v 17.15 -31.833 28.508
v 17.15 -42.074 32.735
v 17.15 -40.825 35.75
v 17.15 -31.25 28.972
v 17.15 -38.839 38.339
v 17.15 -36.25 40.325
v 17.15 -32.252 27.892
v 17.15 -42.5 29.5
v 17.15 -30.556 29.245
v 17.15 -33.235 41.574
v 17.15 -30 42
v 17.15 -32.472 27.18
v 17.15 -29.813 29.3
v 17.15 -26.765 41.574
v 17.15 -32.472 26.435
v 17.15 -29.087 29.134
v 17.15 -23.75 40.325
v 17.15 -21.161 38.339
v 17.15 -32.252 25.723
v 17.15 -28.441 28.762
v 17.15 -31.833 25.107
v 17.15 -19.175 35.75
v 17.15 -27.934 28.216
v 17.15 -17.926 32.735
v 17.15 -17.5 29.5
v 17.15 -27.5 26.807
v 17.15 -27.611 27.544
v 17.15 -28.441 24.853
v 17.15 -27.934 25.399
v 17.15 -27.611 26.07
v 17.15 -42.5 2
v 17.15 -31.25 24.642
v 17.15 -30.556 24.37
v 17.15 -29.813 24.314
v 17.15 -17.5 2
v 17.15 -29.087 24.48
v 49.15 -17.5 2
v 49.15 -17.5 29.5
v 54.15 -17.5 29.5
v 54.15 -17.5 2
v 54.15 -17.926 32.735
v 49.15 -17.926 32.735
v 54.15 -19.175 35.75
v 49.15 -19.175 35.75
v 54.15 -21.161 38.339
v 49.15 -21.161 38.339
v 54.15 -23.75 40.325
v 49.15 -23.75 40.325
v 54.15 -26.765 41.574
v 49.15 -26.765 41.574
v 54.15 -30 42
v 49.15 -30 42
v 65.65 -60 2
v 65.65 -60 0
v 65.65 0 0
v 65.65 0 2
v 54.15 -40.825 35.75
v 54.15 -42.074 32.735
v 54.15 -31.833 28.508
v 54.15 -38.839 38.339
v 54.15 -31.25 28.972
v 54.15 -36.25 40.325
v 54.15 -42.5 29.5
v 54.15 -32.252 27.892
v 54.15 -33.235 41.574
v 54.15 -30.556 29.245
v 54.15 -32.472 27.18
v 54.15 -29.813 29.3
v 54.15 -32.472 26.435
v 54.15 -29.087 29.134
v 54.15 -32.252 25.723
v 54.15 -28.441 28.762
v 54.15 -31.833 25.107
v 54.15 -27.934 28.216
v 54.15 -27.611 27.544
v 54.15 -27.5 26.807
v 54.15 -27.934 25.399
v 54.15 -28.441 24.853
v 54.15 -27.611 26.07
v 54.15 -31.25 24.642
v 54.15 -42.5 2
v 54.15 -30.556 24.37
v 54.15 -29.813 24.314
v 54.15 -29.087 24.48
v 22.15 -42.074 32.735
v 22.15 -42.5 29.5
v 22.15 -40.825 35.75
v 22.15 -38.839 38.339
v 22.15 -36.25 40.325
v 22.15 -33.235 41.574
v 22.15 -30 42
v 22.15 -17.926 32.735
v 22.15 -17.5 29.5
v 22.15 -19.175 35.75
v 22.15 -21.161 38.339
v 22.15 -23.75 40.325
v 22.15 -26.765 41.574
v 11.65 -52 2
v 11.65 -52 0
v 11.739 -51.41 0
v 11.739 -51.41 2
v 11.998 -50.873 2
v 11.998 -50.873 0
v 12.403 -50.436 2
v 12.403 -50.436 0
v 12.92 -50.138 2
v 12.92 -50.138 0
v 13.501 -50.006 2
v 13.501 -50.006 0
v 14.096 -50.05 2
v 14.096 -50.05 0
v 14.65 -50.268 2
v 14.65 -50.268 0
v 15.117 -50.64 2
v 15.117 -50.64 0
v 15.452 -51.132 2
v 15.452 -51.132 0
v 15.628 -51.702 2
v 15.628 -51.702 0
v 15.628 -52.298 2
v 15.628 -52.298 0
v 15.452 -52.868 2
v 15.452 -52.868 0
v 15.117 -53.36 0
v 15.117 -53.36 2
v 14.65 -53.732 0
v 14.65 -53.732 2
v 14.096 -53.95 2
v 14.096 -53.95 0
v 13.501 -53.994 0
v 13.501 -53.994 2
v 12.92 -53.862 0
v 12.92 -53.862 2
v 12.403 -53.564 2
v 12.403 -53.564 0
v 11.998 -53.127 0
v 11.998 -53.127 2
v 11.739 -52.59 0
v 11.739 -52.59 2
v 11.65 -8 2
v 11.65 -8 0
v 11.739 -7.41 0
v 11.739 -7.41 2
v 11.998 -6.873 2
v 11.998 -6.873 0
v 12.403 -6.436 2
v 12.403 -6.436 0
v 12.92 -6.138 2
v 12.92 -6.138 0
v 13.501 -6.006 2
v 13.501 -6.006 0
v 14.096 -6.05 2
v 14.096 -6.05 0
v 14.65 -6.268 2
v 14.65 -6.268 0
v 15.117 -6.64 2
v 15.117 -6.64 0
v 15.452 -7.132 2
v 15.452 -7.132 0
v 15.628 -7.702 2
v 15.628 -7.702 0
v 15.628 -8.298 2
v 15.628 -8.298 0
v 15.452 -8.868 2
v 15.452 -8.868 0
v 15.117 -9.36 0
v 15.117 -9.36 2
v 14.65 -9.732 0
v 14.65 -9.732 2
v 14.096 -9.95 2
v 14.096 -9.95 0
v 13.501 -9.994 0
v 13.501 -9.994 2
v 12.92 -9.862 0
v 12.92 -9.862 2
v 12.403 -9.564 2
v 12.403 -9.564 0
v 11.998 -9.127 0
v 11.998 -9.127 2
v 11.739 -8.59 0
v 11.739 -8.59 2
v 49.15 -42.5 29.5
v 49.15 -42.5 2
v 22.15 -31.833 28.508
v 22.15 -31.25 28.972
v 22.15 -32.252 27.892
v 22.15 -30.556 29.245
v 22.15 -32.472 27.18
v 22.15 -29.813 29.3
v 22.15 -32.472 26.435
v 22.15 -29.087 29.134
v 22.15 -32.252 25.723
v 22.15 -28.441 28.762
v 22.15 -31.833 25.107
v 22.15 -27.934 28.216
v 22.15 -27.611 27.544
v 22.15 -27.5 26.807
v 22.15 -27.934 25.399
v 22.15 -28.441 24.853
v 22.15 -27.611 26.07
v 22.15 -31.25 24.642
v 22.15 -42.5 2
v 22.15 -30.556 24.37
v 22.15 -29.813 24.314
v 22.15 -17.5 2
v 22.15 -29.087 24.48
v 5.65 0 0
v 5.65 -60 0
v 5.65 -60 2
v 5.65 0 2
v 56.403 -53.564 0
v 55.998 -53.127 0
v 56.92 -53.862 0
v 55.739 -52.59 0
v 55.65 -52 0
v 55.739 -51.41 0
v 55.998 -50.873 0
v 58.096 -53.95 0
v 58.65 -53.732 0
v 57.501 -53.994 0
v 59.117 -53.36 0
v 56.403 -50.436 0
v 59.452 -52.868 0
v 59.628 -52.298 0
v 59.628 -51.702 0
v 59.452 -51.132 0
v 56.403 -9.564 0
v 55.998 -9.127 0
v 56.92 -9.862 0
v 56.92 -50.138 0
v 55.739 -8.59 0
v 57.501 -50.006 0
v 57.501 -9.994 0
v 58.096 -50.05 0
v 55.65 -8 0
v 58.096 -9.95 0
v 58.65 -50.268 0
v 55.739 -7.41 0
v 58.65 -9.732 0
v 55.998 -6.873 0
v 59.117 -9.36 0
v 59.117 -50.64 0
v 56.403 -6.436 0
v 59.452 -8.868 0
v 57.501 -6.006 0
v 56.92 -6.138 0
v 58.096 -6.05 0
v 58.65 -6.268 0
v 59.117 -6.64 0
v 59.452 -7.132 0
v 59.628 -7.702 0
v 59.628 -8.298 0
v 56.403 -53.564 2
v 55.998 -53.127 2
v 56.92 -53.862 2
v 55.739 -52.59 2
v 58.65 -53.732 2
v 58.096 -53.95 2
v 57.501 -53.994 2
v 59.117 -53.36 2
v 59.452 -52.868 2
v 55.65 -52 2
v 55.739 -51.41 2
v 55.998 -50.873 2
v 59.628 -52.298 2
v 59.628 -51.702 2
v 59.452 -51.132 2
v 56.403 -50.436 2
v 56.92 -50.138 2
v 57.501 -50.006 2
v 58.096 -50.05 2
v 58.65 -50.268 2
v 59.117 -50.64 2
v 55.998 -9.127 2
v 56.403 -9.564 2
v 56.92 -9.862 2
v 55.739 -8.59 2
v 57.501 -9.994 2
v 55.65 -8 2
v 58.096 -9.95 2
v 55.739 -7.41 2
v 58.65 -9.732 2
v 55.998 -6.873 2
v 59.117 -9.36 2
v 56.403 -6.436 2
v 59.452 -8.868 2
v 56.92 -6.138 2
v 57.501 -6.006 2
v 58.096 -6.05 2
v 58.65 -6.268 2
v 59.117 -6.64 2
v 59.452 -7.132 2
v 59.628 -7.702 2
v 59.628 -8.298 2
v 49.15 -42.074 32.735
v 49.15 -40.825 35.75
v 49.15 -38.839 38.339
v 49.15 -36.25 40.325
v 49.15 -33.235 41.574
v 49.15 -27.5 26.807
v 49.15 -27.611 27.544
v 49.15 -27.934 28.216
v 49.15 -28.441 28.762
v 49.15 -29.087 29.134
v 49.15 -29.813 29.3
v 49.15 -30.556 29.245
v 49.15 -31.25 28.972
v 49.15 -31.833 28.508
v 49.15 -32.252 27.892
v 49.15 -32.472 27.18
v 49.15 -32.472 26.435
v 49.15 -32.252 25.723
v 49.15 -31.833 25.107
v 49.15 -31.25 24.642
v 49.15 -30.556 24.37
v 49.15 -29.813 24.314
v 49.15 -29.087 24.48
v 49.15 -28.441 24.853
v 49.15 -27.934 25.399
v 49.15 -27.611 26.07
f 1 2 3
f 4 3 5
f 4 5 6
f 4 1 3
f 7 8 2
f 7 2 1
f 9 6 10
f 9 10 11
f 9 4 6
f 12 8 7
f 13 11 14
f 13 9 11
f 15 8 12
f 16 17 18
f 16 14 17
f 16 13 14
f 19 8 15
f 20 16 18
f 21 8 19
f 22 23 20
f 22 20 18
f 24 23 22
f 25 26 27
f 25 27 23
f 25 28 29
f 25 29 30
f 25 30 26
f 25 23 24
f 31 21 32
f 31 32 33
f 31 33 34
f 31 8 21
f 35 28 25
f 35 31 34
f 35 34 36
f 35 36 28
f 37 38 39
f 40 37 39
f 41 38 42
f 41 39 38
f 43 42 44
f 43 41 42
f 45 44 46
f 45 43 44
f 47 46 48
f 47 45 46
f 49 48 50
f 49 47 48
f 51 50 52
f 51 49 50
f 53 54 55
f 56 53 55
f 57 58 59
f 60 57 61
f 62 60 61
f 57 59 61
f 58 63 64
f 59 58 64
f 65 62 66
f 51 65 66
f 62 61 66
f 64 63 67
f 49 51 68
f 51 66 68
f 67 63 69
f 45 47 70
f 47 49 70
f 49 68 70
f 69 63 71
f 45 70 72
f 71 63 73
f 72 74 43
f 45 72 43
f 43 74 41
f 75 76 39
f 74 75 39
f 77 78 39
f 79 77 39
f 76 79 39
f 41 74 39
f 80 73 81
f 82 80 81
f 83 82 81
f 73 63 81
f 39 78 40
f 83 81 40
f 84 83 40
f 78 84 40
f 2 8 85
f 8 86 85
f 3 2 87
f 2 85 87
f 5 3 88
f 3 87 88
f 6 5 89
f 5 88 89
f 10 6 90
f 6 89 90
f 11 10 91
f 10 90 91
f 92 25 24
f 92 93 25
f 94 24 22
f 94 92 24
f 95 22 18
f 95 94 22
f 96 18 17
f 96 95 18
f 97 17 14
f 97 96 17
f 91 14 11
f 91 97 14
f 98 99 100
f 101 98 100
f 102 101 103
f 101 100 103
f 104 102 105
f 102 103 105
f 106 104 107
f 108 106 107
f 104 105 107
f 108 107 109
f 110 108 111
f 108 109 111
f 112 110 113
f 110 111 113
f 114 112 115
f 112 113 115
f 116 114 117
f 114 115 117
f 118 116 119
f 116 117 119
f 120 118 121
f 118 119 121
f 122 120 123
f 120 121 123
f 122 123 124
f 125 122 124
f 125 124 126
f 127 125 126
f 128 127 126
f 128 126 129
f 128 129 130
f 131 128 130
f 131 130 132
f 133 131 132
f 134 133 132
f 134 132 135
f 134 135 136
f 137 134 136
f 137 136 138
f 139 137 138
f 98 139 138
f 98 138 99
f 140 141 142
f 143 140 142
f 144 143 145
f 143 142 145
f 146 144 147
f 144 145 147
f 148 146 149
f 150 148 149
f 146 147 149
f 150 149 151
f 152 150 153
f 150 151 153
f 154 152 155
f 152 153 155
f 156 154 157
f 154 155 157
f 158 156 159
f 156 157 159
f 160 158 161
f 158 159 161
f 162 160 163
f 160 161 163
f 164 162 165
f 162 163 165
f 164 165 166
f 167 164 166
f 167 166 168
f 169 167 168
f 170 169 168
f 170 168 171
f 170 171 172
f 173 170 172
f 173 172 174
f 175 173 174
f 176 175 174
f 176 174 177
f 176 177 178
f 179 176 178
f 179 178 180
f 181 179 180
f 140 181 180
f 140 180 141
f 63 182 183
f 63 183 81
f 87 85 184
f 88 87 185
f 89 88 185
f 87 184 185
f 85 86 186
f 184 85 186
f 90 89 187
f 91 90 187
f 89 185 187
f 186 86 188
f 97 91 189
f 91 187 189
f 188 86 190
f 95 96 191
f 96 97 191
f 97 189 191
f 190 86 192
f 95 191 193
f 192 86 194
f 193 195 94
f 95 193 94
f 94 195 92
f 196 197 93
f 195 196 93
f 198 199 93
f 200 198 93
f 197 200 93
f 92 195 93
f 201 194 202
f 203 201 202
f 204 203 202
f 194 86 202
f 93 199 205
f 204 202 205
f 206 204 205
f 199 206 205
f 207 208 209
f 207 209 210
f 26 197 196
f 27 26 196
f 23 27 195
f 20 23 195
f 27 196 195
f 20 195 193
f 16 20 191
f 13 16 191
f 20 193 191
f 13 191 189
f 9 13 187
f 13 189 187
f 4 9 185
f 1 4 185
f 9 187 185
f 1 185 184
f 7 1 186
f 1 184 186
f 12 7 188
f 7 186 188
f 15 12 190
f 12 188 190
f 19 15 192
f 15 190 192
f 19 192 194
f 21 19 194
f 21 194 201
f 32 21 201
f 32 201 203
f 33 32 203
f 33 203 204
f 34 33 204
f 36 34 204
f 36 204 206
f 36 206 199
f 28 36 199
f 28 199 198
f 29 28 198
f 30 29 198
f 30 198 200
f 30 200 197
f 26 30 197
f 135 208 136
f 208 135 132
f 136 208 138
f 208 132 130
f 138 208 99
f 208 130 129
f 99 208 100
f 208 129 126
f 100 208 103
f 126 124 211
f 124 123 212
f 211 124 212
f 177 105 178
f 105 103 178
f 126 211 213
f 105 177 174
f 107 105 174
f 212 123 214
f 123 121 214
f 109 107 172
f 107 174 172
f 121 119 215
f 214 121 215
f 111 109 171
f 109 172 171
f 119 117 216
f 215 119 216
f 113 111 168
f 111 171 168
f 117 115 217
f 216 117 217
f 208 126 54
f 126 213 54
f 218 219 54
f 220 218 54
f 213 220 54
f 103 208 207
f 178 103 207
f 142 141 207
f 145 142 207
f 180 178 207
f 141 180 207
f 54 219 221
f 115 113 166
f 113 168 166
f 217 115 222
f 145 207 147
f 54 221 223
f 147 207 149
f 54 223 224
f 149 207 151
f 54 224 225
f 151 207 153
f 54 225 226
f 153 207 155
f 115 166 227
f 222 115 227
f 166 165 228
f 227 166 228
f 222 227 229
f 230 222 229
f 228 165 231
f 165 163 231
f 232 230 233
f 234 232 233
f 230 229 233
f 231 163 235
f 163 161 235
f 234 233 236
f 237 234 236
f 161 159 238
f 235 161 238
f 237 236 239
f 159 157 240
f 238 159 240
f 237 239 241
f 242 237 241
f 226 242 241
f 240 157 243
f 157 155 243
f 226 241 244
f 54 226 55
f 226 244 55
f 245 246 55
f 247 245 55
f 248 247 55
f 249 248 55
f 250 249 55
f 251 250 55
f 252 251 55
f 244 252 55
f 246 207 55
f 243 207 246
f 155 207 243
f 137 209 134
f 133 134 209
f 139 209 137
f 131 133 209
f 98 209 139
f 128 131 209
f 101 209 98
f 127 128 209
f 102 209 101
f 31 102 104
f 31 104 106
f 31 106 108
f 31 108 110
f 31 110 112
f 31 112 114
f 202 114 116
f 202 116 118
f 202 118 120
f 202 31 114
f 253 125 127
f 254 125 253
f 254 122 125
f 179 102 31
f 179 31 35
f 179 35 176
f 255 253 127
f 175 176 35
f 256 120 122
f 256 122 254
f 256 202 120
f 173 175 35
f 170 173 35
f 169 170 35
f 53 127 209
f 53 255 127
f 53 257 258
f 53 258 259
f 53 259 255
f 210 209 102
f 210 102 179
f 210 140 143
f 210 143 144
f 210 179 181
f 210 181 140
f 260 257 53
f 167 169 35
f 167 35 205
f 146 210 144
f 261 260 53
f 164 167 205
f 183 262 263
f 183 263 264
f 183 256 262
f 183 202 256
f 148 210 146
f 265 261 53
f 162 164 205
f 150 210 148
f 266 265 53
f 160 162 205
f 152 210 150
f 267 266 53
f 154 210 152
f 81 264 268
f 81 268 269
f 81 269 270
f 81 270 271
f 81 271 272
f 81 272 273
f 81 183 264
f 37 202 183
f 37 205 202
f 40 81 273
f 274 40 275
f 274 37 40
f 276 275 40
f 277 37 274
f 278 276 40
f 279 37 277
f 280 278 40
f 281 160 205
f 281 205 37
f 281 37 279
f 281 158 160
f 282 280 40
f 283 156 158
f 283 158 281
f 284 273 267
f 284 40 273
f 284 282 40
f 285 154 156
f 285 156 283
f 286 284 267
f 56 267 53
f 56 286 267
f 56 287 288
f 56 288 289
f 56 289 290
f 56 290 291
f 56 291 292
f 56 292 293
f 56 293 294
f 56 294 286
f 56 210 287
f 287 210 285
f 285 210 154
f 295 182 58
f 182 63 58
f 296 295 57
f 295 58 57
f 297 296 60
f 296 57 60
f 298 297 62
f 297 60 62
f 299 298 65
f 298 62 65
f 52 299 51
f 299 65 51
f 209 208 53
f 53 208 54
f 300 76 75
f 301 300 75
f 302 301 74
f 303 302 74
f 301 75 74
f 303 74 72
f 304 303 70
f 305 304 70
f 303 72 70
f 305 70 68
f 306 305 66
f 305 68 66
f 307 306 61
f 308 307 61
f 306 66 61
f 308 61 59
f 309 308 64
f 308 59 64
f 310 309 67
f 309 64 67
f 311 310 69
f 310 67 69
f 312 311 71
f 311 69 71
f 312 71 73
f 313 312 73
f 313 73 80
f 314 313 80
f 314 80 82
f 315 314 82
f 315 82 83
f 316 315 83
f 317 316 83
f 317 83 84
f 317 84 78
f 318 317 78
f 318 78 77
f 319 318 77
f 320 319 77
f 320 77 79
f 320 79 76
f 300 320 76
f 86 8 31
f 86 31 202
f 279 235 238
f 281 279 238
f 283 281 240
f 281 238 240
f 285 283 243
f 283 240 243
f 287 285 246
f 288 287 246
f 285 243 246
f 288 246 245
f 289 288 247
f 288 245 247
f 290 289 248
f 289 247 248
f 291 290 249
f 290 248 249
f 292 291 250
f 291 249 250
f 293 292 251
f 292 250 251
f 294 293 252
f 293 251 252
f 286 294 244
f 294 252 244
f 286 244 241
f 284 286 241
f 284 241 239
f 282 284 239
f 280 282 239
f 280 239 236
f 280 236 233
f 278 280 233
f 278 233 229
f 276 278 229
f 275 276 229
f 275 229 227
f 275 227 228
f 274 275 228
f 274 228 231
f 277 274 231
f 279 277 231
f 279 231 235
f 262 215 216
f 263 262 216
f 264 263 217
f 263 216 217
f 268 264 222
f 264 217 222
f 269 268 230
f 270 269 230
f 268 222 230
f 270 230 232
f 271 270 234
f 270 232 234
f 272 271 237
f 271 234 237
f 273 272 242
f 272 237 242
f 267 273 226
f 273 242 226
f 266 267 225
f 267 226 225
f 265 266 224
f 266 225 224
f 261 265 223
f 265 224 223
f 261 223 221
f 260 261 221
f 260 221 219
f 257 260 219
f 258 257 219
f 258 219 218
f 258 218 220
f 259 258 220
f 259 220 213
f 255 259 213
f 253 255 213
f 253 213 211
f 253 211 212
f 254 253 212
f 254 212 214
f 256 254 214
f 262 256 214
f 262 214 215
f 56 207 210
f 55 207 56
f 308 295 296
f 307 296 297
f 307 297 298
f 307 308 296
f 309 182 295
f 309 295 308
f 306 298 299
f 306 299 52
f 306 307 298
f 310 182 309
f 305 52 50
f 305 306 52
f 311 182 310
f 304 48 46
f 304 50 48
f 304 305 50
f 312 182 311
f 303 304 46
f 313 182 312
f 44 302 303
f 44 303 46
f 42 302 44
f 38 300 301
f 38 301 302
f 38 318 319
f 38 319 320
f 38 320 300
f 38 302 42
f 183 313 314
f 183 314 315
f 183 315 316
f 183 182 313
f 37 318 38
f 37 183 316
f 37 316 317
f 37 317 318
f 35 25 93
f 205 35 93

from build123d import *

# Parameters (mm, degrees)
F0_W     = 60
F0_H     = 60
F1_DEPTH = 2
F2_W     = 5
F2_H     = 25
F3_DEPTH = 40
F4_DEPTH = 40
F5_R     = 12.49999
F7_D     = 5
F9_D     = 4
F9_DEPTH = 15
F9_TIP   = 1.2017212381


# Not quite as in the source:
# - a fillet or chamfer is up to 0.001 mm smaller than in the source, because OpenCascade refuses the exact size


with BuildPart() as f1:
    # F0 (on Top) → F1 (new body)
    with BuildSketch(Plane.XY):
        with Locations((35.6504749941, -30)):
            Rectangle(F0_W, F0_H)
    extrude(amount=F1_DEPTH)

    # F2 (on face) → F3 (join)
    with BuildSketch(Plane.XY.offset(2)):
        with Locations((19.6504749941, -30)):
            Rectangle(F2_W, F2_H)
    extrude(amount=F3_DEPTH)

    # F2 (on face) → F4 (join)
    with BuildSketch(Plane.XY.offset(2)):
        with Locations((51.6504749941, -30)):
            Rectangle(F2_W, F2_H)
    extrude(amount=F4_DEPTH)

    # F5 (radius 12.5 in the source; OpenCascade refuses exactly that, so slightly less here)
    f5_edges = [f1.edges().sort_by_distance(p)[0] for p in [
        (19.650475, -42.5, 42),
        (51.650475, -42.5, 42),
        (51.650475, -17.5, 42),
        (19.650475, -17.5, 42),
    ]]
    fillet(f5_edges, radius=F5_R)

    # F7 (through all)
    with Locations(Plane(origin=(17.1504749941, 0, 0), x_dir=(0, -1, 0), z_dir=(-1, 0, 0))):
        with Locations((30, 26.8072411418)):
            Hole(F7_D / 2)

    # F9
    with Locations(Plane.XY.offset(2)):
        with Locations((13.6504749941, -8), (13.6504749941, -52), (57.6504749941, -52), (57.6504749941, -8)):
            Hole(F9_D / 2, depth=F9_DEPTH)
            with Locations((0, 0, -(F9_DEPTH + F9_TIP / 2))):  # 118° drill point
                Cone(0, F9_D / 2, F9_TIP, mode=Mode.SUBTRACT)


solid = f1.part
